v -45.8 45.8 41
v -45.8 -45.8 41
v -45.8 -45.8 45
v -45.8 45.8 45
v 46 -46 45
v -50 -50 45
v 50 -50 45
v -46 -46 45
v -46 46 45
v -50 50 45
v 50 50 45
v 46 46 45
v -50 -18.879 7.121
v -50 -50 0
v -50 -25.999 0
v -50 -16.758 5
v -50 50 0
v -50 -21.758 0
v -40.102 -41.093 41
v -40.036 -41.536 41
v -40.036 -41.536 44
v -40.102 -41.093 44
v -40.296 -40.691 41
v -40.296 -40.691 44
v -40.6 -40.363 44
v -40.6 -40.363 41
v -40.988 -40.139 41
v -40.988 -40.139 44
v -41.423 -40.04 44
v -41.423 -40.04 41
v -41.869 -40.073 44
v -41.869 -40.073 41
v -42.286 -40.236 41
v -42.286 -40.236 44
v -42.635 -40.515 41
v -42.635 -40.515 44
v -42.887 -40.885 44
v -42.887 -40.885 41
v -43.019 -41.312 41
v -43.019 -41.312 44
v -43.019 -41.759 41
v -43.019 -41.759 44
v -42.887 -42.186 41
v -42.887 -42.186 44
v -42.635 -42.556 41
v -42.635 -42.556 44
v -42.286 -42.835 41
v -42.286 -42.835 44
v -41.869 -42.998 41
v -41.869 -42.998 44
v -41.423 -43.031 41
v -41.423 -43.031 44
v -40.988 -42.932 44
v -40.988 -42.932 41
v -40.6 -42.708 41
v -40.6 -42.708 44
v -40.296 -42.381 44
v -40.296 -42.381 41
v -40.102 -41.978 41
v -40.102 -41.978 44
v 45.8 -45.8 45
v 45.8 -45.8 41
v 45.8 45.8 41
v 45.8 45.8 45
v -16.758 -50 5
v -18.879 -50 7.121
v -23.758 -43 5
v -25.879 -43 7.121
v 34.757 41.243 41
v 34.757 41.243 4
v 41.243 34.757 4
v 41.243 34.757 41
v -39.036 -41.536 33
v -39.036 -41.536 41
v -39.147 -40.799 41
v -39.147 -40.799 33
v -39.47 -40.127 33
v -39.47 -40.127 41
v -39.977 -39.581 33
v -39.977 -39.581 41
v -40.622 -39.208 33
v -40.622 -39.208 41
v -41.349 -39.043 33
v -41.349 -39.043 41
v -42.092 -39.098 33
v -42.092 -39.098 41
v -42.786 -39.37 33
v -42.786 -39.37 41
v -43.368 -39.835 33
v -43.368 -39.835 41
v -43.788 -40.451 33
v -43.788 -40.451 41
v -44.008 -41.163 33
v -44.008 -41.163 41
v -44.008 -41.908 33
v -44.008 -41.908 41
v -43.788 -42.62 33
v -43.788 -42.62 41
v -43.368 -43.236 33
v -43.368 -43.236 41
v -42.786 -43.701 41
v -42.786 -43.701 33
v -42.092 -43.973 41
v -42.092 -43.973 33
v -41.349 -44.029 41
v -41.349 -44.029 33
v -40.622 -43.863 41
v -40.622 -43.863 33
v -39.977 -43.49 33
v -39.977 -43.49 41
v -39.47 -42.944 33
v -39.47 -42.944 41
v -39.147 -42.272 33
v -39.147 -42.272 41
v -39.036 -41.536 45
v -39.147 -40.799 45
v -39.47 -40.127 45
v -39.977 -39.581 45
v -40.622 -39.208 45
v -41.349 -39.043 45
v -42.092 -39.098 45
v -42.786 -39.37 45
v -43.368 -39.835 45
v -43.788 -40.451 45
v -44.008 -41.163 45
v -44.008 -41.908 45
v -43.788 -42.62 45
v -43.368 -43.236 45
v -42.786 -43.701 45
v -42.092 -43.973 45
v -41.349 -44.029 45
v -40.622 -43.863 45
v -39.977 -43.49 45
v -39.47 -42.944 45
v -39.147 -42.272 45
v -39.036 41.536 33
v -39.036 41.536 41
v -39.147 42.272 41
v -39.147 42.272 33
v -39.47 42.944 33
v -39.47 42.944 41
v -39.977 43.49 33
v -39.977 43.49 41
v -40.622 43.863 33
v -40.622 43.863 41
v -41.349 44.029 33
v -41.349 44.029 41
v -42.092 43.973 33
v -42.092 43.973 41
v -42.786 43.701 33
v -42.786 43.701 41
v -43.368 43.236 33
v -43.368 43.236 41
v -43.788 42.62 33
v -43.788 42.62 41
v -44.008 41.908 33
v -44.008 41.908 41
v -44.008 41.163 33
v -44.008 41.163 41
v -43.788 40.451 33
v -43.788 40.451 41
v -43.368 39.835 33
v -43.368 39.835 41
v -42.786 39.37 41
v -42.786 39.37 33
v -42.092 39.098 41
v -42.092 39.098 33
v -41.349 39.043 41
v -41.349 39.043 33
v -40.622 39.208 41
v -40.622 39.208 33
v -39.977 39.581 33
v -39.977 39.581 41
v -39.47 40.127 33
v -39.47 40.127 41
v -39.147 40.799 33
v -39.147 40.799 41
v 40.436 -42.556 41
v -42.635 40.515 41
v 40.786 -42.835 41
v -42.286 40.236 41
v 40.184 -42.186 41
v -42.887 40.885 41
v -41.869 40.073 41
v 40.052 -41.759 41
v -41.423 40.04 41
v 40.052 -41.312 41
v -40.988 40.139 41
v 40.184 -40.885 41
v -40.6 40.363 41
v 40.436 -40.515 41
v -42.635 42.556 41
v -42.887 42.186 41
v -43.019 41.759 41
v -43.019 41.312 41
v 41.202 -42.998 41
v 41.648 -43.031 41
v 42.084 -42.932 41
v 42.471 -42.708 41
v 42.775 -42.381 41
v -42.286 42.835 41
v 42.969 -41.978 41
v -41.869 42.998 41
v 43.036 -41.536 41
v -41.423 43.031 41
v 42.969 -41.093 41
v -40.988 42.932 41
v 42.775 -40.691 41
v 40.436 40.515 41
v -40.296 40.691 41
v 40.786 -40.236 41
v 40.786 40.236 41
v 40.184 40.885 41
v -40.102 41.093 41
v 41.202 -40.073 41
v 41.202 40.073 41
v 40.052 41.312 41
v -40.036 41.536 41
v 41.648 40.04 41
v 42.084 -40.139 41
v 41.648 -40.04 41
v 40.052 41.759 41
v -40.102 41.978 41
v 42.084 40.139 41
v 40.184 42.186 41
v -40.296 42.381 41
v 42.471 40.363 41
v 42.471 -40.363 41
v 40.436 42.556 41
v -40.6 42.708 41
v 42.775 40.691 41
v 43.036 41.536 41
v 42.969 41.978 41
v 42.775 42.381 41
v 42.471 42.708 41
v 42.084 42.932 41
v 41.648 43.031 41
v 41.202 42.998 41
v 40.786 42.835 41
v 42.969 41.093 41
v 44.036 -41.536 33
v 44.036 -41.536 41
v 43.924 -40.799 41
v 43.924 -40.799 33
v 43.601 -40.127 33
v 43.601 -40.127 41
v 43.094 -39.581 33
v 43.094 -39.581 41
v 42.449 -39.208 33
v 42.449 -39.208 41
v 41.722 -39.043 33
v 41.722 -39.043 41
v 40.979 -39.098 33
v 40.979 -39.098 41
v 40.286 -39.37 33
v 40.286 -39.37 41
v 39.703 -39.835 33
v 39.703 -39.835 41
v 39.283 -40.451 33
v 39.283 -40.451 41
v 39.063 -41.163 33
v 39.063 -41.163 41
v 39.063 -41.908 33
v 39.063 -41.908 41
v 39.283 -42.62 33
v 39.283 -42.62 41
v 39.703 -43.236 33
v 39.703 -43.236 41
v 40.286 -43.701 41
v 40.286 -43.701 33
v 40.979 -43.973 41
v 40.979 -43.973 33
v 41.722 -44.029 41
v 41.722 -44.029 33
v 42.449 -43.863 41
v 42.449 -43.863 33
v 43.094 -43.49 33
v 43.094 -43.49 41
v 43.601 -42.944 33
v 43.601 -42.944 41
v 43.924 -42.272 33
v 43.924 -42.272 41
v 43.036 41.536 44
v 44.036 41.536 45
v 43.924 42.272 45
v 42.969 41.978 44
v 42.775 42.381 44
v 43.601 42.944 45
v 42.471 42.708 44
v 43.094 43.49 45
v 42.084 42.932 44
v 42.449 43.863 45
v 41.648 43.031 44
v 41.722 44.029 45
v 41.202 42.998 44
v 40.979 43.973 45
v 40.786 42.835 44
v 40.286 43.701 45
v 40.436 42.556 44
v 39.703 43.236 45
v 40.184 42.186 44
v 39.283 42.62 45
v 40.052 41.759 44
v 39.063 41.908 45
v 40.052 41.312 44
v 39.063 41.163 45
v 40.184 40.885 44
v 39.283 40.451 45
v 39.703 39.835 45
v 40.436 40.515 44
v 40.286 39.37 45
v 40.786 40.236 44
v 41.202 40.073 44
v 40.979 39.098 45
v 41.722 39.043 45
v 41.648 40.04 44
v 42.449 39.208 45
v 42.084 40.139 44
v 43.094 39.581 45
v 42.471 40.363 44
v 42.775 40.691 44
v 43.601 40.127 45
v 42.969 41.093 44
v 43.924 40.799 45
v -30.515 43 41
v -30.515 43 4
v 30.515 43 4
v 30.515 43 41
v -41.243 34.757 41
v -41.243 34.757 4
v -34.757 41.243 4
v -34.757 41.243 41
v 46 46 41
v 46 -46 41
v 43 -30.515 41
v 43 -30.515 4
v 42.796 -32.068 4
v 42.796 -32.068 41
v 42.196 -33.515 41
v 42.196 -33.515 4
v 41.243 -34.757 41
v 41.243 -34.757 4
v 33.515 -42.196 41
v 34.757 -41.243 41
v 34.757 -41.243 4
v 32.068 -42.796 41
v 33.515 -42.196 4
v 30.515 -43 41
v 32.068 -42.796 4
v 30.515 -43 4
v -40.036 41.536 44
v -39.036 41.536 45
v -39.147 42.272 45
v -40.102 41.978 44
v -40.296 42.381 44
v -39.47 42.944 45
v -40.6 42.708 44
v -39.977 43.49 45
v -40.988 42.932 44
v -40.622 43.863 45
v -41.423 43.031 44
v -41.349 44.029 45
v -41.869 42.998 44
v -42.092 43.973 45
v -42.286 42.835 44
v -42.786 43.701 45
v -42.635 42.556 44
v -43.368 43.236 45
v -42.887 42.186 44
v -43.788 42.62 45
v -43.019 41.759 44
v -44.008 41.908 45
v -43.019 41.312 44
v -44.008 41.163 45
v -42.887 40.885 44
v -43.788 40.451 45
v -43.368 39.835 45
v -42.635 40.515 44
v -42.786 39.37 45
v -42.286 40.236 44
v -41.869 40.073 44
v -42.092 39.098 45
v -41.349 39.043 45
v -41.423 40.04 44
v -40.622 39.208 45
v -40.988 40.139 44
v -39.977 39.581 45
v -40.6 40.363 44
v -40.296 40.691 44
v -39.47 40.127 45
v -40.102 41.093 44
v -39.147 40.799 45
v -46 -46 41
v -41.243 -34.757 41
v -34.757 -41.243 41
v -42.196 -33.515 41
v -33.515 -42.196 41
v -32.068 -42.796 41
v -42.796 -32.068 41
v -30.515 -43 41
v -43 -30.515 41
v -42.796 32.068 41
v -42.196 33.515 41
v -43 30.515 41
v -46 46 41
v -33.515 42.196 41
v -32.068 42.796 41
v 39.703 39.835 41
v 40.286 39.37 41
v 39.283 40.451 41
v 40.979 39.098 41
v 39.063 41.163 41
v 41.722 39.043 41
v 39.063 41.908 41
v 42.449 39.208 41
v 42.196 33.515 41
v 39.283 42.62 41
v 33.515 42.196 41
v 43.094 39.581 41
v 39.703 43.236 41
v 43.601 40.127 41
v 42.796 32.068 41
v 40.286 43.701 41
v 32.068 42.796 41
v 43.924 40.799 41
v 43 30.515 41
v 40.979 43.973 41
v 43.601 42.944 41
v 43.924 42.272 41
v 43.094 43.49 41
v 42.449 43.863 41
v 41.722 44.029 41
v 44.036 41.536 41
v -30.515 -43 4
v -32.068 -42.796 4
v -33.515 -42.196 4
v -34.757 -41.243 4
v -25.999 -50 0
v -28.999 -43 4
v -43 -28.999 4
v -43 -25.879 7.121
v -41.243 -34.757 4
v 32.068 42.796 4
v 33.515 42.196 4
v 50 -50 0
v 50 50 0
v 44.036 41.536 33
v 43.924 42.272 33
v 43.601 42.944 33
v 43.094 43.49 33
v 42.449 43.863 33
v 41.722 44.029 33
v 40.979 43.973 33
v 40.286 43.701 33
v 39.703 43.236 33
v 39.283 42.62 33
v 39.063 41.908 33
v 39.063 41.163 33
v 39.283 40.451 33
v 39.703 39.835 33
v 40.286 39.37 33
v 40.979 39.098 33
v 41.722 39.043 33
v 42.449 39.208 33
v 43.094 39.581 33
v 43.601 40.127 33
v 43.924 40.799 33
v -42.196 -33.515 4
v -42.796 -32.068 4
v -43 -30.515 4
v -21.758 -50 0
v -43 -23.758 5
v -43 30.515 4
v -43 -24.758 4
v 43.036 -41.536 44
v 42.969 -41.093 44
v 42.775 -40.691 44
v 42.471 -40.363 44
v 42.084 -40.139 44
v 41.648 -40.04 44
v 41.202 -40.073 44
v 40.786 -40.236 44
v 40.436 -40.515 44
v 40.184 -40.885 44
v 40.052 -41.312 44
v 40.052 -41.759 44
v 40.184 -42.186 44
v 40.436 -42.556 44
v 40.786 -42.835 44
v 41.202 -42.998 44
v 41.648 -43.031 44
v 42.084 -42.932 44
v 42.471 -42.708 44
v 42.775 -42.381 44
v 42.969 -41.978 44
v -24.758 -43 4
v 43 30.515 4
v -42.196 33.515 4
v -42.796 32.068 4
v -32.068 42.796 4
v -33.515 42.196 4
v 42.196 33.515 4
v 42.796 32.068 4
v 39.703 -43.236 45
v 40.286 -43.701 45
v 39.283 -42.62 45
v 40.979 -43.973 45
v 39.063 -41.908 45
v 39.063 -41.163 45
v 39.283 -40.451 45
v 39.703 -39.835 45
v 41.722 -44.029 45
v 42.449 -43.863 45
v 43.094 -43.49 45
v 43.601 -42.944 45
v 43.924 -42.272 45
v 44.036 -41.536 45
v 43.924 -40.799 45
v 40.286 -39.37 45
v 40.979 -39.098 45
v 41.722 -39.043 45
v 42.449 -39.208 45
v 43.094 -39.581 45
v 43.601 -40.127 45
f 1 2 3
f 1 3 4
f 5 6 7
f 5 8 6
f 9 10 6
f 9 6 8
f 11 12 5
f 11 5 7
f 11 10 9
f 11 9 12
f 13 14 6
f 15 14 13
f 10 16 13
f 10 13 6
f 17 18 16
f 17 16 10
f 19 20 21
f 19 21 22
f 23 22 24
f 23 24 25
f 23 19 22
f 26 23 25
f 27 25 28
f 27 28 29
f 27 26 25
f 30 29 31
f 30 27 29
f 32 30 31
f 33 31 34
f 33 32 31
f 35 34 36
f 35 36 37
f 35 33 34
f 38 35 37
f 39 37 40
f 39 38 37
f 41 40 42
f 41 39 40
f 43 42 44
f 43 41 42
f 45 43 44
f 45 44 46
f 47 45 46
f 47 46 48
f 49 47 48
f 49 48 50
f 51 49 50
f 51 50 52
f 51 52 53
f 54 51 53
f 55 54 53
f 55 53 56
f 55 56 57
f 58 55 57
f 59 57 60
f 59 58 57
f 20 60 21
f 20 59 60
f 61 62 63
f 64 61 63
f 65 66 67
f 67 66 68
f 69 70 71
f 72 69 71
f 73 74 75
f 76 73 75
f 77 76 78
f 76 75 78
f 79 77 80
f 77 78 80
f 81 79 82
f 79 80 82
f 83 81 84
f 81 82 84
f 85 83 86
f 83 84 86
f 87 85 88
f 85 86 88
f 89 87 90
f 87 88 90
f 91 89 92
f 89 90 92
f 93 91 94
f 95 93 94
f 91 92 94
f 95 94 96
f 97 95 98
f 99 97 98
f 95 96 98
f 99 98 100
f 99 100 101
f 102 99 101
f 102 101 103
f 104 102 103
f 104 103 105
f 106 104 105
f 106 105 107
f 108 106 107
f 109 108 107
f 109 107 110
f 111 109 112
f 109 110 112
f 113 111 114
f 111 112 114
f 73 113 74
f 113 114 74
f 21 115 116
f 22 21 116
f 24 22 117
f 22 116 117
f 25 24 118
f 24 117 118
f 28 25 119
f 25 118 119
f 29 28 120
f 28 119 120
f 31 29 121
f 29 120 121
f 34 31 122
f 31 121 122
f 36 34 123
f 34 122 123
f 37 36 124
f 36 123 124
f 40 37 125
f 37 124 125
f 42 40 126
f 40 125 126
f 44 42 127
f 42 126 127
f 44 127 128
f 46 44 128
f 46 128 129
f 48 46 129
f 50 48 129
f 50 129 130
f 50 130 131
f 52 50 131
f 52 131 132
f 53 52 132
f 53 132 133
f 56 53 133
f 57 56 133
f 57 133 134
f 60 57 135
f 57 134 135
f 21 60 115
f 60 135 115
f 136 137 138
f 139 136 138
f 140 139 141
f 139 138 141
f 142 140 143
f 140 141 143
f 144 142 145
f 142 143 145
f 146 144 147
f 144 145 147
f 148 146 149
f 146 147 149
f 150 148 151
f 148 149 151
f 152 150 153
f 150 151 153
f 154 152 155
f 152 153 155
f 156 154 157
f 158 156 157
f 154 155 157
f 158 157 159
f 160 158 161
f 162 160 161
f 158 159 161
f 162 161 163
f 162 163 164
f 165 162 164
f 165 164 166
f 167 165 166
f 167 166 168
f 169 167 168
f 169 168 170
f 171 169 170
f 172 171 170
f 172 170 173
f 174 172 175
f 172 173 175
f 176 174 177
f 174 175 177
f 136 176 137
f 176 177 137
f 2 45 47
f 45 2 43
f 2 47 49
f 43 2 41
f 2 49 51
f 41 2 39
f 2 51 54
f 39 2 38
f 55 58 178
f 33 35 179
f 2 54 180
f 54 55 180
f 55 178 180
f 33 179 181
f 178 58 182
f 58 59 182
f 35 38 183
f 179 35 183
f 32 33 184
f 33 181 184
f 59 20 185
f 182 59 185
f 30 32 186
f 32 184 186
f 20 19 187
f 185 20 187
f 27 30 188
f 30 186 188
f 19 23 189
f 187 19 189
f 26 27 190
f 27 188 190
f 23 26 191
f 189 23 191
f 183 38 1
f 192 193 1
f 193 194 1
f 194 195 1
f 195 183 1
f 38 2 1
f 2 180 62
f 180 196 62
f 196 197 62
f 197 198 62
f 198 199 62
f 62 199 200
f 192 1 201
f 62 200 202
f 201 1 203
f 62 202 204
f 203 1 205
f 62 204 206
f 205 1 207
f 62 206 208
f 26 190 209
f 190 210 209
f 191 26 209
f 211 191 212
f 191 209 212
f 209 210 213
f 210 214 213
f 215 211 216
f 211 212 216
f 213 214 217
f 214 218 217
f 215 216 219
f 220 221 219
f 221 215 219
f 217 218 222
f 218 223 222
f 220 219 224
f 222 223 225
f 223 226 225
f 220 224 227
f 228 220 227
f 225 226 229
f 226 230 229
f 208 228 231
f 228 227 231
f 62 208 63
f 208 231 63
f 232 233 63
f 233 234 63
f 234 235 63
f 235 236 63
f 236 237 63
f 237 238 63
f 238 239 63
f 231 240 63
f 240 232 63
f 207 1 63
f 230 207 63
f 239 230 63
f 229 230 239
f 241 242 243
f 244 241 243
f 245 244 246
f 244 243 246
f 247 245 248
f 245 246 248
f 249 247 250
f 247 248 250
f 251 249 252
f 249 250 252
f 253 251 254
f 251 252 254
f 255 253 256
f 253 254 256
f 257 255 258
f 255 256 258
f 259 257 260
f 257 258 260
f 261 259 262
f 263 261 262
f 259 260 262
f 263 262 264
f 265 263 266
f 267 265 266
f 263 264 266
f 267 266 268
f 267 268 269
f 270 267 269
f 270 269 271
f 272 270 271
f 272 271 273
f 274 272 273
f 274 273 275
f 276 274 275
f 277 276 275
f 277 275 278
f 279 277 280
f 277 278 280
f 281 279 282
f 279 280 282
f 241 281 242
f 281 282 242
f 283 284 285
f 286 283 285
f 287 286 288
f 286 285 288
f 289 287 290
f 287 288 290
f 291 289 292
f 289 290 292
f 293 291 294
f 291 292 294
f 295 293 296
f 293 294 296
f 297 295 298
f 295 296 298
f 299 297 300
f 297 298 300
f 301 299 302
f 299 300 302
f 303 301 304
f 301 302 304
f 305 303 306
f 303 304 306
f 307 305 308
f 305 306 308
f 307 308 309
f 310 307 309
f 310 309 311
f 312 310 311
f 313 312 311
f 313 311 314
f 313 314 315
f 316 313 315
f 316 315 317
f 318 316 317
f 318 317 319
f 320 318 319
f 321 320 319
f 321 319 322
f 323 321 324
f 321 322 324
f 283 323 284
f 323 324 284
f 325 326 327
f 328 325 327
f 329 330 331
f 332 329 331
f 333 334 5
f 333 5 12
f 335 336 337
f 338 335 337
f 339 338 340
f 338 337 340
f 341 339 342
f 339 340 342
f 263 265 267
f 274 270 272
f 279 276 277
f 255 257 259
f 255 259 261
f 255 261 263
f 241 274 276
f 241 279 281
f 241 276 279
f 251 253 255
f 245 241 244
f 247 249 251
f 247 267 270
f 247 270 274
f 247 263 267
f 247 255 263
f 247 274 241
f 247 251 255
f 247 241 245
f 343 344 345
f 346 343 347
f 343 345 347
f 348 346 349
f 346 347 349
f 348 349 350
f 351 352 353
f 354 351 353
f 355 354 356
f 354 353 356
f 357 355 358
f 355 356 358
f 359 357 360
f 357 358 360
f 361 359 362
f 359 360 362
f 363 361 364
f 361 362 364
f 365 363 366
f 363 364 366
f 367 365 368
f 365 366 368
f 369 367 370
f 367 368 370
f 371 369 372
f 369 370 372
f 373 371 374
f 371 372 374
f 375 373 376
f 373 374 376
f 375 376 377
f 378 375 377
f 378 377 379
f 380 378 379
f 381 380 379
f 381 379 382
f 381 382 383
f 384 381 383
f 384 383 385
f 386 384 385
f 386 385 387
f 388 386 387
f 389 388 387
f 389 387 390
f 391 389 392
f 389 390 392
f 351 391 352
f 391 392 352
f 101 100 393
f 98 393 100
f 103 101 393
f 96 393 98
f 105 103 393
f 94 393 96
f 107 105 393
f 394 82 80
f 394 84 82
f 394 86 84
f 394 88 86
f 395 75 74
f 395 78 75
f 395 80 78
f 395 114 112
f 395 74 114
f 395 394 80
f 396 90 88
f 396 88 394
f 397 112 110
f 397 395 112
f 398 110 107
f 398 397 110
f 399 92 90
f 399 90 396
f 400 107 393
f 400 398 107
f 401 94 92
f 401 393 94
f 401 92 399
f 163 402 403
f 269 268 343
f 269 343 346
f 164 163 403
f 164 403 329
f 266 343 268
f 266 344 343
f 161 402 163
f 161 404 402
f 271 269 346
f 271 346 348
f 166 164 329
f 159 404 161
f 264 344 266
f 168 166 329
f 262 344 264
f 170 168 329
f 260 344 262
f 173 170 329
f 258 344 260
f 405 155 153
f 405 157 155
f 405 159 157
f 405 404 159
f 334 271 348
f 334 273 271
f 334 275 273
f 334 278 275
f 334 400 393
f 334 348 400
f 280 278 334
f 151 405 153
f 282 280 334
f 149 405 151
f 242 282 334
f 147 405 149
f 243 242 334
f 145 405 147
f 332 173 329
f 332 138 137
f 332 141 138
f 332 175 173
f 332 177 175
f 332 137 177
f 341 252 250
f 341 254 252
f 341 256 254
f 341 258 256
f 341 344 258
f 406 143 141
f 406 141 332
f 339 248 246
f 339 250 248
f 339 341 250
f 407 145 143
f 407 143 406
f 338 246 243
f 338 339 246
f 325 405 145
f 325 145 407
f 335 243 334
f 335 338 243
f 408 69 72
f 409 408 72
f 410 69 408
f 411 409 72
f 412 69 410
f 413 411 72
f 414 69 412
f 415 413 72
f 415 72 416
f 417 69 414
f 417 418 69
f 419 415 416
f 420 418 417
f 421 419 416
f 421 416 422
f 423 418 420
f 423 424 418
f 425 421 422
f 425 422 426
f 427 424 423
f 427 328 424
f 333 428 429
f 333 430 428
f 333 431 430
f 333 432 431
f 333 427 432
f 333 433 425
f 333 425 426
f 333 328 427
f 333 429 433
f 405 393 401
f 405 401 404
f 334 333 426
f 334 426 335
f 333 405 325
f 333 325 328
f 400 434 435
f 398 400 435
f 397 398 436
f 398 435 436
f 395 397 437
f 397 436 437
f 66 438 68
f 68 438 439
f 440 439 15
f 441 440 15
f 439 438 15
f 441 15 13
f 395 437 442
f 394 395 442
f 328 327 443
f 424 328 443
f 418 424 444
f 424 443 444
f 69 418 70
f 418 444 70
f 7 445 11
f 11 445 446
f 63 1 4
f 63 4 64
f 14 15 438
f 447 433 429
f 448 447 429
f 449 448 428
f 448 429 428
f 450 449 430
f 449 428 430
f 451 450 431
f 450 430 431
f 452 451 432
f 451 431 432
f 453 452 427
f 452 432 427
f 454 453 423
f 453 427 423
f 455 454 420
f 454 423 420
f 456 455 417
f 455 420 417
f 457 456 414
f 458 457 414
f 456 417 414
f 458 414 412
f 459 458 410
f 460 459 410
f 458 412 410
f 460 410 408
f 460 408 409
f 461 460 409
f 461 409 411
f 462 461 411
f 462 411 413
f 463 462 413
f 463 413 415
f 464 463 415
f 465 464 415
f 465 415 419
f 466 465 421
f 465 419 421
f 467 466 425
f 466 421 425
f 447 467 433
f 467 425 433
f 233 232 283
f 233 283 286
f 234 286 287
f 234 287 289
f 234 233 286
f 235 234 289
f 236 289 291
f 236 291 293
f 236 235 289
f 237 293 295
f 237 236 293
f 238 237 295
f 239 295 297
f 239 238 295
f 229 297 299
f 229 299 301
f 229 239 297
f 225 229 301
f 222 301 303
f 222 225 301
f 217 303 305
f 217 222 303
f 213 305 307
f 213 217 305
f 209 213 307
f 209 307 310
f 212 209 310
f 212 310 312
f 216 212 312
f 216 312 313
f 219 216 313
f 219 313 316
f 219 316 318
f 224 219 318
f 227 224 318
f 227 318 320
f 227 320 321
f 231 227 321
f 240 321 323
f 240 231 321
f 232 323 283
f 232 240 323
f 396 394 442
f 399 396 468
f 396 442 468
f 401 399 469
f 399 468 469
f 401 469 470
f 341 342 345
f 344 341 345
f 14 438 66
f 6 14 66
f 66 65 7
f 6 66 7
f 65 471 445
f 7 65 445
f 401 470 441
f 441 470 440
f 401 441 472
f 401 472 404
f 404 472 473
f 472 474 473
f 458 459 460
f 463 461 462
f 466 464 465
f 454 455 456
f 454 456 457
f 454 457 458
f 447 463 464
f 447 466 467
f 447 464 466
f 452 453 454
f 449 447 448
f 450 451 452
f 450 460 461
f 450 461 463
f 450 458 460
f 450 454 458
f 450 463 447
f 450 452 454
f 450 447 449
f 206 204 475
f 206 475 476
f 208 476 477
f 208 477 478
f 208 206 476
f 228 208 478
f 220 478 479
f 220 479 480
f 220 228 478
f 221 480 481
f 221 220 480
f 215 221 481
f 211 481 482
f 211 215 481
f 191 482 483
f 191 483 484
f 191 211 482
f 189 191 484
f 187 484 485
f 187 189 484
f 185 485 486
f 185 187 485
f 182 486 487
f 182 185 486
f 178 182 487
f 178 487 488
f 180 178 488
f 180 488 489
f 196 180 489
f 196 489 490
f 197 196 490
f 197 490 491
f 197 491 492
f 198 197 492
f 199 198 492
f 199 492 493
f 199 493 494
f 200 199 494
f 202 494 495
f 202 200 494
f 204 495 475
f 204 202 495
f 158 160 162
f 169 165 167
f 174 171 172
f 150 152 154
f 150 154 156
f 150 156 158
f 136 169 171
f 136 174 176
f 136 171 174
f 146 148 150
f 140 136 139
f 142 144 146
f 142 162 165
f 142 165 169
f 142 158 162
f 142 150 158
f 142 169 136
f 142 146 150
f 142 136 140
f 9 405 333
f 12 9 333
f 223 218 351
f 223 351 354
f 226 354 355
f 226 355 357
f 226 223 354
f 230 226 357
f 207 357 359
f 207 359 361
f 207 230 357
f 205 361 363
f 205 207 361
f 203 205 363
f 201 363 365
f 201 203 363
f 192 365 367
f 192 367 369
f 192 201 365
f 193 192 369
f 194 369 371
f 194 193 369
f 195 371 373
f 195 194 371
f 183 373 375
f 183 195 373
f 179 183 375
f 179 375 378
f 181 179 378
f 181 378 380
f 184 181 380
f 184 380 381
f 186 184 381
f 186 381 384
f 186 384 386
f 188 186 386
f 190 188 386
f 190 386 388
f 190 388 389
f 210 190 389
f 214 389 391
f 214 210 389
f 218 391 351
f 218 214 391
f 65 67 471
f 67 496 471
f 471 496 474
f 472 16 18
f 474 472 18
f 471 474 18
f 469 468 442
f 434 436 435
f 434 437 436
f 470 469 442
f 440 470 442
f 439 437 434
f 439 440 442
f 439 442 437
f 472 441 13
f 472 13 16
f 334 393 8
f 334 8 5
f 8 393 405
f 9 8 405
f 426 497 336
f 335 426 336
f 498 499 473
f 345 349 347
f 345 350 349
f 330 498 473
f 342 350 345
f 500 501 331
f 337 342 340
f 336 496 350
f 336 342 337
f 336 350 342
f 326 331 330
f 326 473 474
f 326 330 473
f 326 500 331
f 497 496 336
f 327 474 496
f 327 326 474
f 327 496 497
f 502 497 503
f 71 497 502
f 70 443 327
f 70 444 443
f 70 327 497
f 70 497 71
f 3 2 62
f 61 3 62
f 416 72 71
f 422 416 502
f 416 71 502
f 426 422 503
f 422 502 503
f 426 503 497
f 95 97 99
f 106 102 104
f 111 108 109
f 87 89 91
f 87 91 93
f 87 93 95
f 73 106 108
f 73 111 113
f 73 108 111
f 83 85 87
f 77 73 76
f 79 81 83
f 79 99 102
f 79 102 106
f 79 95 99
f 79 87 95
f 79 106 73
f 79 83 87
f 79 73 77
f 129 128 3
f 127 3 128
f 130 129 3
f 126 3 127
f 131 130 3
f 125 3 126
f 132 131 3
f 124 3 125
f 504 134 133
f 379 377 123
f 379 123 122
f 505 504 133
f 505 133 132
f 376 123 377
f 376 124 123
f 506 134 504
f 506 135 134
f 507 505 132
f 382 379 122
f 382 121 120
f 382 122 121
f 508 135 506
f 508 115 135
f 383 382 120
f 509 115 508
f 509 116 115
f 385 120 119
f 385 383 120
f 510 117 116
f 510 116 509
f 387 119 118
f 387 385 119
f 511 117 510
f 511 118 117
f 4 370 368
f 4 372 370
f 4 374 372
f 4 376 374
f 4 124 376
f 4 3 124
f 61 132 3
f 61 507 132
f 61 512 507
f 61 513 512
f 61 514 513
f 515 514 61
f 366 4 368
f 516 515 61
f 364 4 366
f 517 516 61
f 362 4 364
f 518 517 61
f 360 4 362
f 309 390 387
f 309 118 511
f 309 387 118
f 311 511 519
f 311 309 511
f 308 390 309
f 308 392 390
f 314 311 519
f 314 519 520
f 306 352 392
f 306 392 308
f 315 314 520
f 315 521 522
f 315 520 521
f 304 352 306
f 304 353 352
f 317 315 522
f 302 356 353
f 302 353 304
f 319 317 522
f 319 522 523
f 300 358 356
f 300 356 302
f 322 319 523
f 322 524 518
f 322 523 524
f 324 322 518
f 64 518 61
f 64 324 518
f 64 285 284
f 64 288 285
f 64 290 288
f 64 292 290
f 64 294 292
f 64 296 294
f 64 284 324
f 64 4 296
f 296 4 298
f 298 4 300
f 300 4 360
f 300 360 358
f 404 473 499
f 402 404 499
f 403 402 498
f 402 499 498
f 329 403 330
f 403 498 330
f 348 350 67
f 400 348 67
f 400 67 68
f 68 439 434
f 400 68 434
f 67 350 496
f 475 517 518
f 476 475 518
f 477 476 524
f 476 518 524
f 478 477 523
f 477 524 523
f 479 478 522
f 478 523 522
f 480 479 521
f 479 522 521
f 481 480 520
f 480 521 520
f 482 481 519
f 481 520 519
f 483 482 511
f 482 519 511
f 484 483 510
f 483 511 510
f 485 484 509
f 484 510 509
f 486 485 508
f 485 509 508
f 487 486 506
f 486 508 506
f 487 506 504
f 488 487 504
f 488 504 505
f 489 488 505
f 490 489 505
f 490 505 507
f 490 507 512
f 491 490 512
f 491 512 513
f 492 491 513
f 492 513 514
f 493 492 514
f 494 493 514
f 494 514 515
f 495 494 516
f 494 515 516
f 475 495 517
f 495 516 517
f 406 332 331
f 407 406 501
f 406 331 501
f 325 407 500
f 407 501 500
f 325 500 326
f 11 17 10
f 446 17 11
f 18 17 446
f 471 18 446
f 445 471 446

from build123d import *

# Parameters (mm, degrees)
F0_W      = 100
F0_H      = 100
F0_W_2    = 92
F0_H_2    = 92
F1_DEPTH  = 45
F2_DEPTH  = 41
F3_DEPTH  = 4
F7_R      = 2.5
F8_DEPTH  = 8
F9_W      = 91.6
F9_H      = 91.6
F9_R      = 2.5
F9_R_2    = 1.5
F10_DEPTH = 4
F11_SIZE  = 1


with BuildPart() as f1:
    # F0 (on Top) → F1 (new body)
    with BuildSketch(Plane.XY):
        Rectangle(F0_W, F0_H)
        Rectangle(F0_W_2, F0_H_2, mode=Mode.SUBTRACT)
    extrude(amount=F1_DEPTH)

    # F0 (on Top) → F2 (join)
    with BuildSketch(Plane.XY):
        Rectangle(F0_W_2, F0_H_2)
        with BuildLine():
            Line((-30.5147186258, 43), (30.5147186258, 43))
            ThreePointArc((30.5147186258, 43), (32.81081922, 42.5432771951), (34.7573593129, 41.2426406871))
            Line((34.7573593129, 41.2426406871), (41.2426406871, 34.7573593129))
            ThreePointArc((41.2426406871, 34.7573593129), (42.5432771951, 32.81081922), (43, 30.5147186258))
            Line((43, 30.5147186258), (43, -30.5147186258))
            ThreePointArc((43, -30.5147186258), (42.5432771951, -32.81081922), (41.2426406871, -34.7573593129))
            Line((41.2426406871, -34.7573593129), (34.7573593129, -41.2426406871))
            ThreePointArc((34.7573593129, -41.2426406871), (32.81081922, -42.5432771951), (30.5147186258, -43))
            Line((30.5147186258, -43), (-30.5147186258, -43))
            ThreePointArc((-30.5147186258, -43), (-32.81081922, -42.5432771951), (-34.7573593129, -41.2426406871))
            Line((-34.7573593129, -41.2426406871), (-41.2426406871, -34.7573593129))
            ThreePointArc((-41.2426406871, -34.7573593129), (-42.5432771951, -32.81081922), (-43, -30.5147186258))
            Line((-43, -30.5147186258), (-43, 30.5147186258))
            ThreePointArc((-43, 30.5147186258), (-42.5432771951, 32.81081922), (-41.2426406871, 34.7573593129))
            Line((-41.2426406871, 34.7573593129), (-34.7573593129, 41.2426406871))
            ThreePointArc((-34.7573593129, 41.2426406871), (-32.81081922, 42.5432771951), (-30.5147186258, 43))
        make_face(mode=Mode.SUBTRACT)
    extrude(amount=F2_DEPTH)

    # F0 (on Top) → F3 (join)
    with BuildSketch(Plane.XY):
        Rectangle(F0_W_2, F0_H_2)
        with BuildLine():
            Line((-30.5147186258, 43), (30.5147186258, 43))
            ThreePointArc((30.5147186258, 43), (32.81081922, 42.5432771951), (34.7573593129, 41.2426406871))
            Line((34.7573593129, 41.2426406871), (41.2426406871, 34.7573593129))
            ThreePointArc((41.2426406871, 34.7573593129), (42.5432771951, 32.81081922), (43, 30.5147186258))
            Line((43, 30.5147186258), (43, -30.5147186258))
            ThreePointArc((43, -30.5147186258), (42.5432771951, -32.81081922), (41.2426406871, -34.7573593129))
            Line((41.2426406871, -34.7573593129), (34.7573593129, -41.2426406871))
            ThreePointArc((34.7573593129, -41.2426406871), (32.81081922, -42.5432771951), (30.5147186258, -43))
            Line((30.5147186258, -43), (-30.5147186258, -43))
            ThreePointArc((-30.5147186258, -43), (-32.81081922, -42.5432771951), (-34.7573593129, -41.2426406871))
            Line((-34.7573593129, -41.2426406871), (-41.2426406871, -34.7573593129))
            ThreePointArc((-41.2426406871, -34.7573593129), (-42.5432771951, -32.81081922), (-43, -30.5147186258))
            Line((-43, -30.5147186258), (-43, 30.5147186258))
            ThreePointArc((-43, 30.5147186258), (-42.5432771951, 32.81081922), (-41.2426406871, 34.7573593129))
            Line((-41.2426406871, 34.7573593129), (-34.7573593129, 41.2426406871))
            ThreePointArc((-34.7573593129, 41.2426406871), (-32.81081922, 42.5432771951), (-30.5147186258, 43))
        make_face(mode=Mode.SUBTRACT)
        with BuildLine():
            ThreePointArc((34.7573593129, 41.2426406871), (32.81081922, 42.5432771951), (30.5147186258, 43))
            Line((30.5147186258, 43), (-30.5147186258, 43))
            ThreePointArc((-30.5147186258, 43), (-32.81081922, 42.5432771951), (-34.7573593129, 41.2426406871))
            Line((-34.7573593129, 41.2426406871), (-41.2426406871, 34.7573593129))
            ThreePointArc((-41.2426406871, 34.7573593129), (-42.5432771951, 32.81081922), (-43, 30.5147186258))
            Line((-43, 30.5147186258), (-43, -30.5147186258))
            ThreePointArc((-43, -30.5147186258), (-42.5432771951, -32.81081922), (-41.2426406871, -34.7573593129))
            Line((-41.2426406871, -34.7573593129), (-34.7573593129, -41.2426406871))
            ThreePointArc((-34.7573593129, -41.2426406871), (-32.81081922, -42.5432771951), (-30.5147186258, -43))
            Line((-30.5147186258, -43), (30.5147186258, -43))
            ThreePointArc((30.5147186258, -43), (32.81081922, -42.5432771951), (34.7573593129, -41.2426406871))
            Line((34.7573593129, -41.2426406871), (41.2426406871, -34.7573593129))
            ThreePointArc((41.2426406871, -34.7573593129), (42.5432771951, -32.81081922), (43, -30.5147186258))
            Line((43, -30.5147186258), (43, 30.5147186258))
            ThreePointArc((43, 30.5147186258), (42.5432771951, 32.81081922), (41.2426406871, 34.7573593129))
            Line((41.2426406871, 34.7573593129), (34.7573593129, 41.2426406871))
        make_face()
    extrude(amount=F3_DEPTH)

    # F6: sweep along a path in F4
    with BuildLine(Plane.XY) as f6_path:
        Line((-14.9084937871, -61.0915062129), (-57.837025553, -18.162974447))
    # F5 (on face) → F6 (sweep, cut)
    with BuildSketch(Plane(origin=(-50, 0, 0), x_dir=(0, -1, 0), z_dir=(-1, 0, 0))):
        Polygon((16.7576958239, 5), (21.7576958239, 0), (25.9994026273, 0), (18.8785492256, 7.1208534017), align=None)
    sweep(path=f6_path.line, mode=Mode.SUBTRACT)

    # F7 (on face) → F8 (cut)
    with BuildSketch(Plane.XY.offset(41)):
        with Locations((-41.5355339059, 41.5355339059)):
            Circle(F7_R)
        with Locations((41.5355339059, 41.5355339059)):
            Circle(F7_R)
        with Locations((41.5355339059, -41.5355339059)):
            Circle(F7_R)
        with Locations((-41.5355339059, -41.5355339059)):
            Circle(F7_R)
    extrude(amount=-F8_DEPTH, mode=Mode.SUBTRACT)


with BuildPart() as f10:
    # F9 (on face) → F10 (new body)
    with BuildSketch(Plane.XY.offset(41)):
        Rectangle(F9_W, F9_H)
        with Locations((-41.5355339059, -41.5355339059)):
            Circle(F9_R, mode=Mode.SUBTRACT)
        with Locations((41.5355339059, -41.5355339059)):
            Circle(F9_R, mode=Mode.SUBTRACT)
        with Locations((-41.5355339059, 41.5355339059)):
            Circle(F9_R, mode=Mode.SUBTRACT)
        with BuildLine():
            ThreePointArc((-34.7573593129, 41.2426406871), (-32.81081922, 42.5432771951), (-30.5147186258, 43))
            Line((-30.5147186258, 43), (30.5147186258, 43))
            ThreePointArc((30.5147186258, 43), (32.81081922, 42.5432771951), (34.7573593129, 41.2426406871))
            Line((34.7573593129, 41.2426406871), (41.2426406871, 34.7573593129))
            ThreePointArc((41.2426406871, 34.7573593129), (42.5432771951, 32.81081922), (43, 30.5147186258))
            Line((43, 30.5147186258), (43, -30.5147186258))
            ThreePointArc((43, -30.5147186258), (42.5432771951, -32.81081922), (41.2426406871, -34.7573593129))
            Line((41.2426406871, -34.7573593129), (34.7573593129, -41.2426406871))
            ThreePointArc((34.7573593129, -41.2426406871), (32.81081922, -42.5432771951), (30.5147186258, -43))
            Line((30.5147186258, -43), (-30.5147186258, -43))
            ThreePointArc((-30.5147186258, -43), (-32.81081922, -42.5432771951), (-34.7573593129, -41.2426406871))
            Line((-34.7573593129, -41.2426406871), (-41.2426406871, -34.7573593129))
            ThreePointArc((-41.2426406871, -34.7573593129), (-42.5432771951, -32.81081922), (-43, -30.5147186258))
            Line((-43, -30.5147186258), (-43, 30.5147186258))
            ThreePointArc((-43, 30.5147186258), (-42.5432771951, 32.81081922), (-41.2426406871, 34.7573593129))
            Line((-41.2426406871, 34.7573593129), (-34.7573593129, 41.2426406871))
        make_face(mode=Mode.SUBTRACT)
        with Locations((41.5355339059, 41.5355339059)):
            Circle(F9_R, mode=Mode.SUBTRACT)
        with BuildLine():
            Line((30.5147186258, 43), (-30.5147186258, 43))
            ThreePointArc((-30.5147186258, 43), (-32.81081922, 42.5432771951), (-34.7573593129, 41.2426406871))
            Line((-34.7573593129, 41.2426406871), (-41.2426406871, 34.7573593129))
            ThreePointArc((-41.2426406871, 34.7573593129), (-42.5432771951, 32.81081922), (-43, 30.5147186258))
            Line((-43, 30.5147186258), (-43, -30.5147186258))
            ThreePointArc((-43, -30.5147186258), (-42.5432771951, -32.81081922), (-41.2426406871, -34.7573593129))
            Line((-41.2426406871, -34.7573593129), (-34.7573593129, -41.2426406871))
            ThreePointArc((-34.7573593129, -41.2426406871), (-32.81081922, -42.5432771951), (-30.5147186258, -43))
            Line((-30.5147186258, -43), (30.5147186258, -43))
            ThreePointArc((30.5147186258, -43), (32.81081922, -42.5432771951), (34.7573593129, -41.2426406871))
            Line((34.7573593129, -41.2426406871), (41.2426406871, -34.7573593129))
            ThreePointArc((41.2426406871, -34.7573593129), (42.5432771951, -32.81081922), (43, -30.5147186258))
            Line((43, -30.5147186258), (43, 30.5147186258))
            ThreePointArc((43, 30.5147186258), (42.5432771951, 32.81081922), (41.2426406871, 34.7573593129))
            Line((41.2426406871, 34.7573593129), (34.7573593129, 41.2426406871))
            ThreePointArc((34.7573593129, 41.2426406871), (32.81081922, 42.5432771951), (30.5147186258, 43))
        make_face()
        with Locations((-41.5355339059, 41.5355339059)):
            Circle(F9_R)
        with Locations((-41.5355339059, 41.5355339059)):
            Circle(F9_R_2, mode=Mode.SUBTRACT)
        with Locations((-41.5355339059, -41.5355339059)):
            Circle(F9_R)
        with Locations((-41.5355339059, -41.5355339059)):
            Circle(F9_R_2, mode=Mode.SUBTRACT)
        with Locations((41.5355339059, -41.5355339059)):
            Circle(F9_R)
        with Locations((41.5355339059, -41.5355339059)):
            Circle(F9_R_2, mode=Mode.SUBTRACT)
        with Locations((41.5355339059, 41.5355339059)):
            Circle(F9_R)
        with Locations((41.5355339059, 41.5355339059)):
            Circle(F9_R_2, mode=Mode.SUBTRACT)
    extrude(amount=F10_DEPTH)

    # F11
    f11_edges = [f10.edges().sort_by_distance(p)[0] for p in [
        (-43.035534, 41.535534, 45),
        (40.035534, 41.535534, 45),
        (-43.035534, -41.535534, 45),
        (40.035534, -41.535534, 45),
    ]]
    chamfer(f11_edges, length=F11_SIZE)


solid = Compound([f1.part, f10.part])
